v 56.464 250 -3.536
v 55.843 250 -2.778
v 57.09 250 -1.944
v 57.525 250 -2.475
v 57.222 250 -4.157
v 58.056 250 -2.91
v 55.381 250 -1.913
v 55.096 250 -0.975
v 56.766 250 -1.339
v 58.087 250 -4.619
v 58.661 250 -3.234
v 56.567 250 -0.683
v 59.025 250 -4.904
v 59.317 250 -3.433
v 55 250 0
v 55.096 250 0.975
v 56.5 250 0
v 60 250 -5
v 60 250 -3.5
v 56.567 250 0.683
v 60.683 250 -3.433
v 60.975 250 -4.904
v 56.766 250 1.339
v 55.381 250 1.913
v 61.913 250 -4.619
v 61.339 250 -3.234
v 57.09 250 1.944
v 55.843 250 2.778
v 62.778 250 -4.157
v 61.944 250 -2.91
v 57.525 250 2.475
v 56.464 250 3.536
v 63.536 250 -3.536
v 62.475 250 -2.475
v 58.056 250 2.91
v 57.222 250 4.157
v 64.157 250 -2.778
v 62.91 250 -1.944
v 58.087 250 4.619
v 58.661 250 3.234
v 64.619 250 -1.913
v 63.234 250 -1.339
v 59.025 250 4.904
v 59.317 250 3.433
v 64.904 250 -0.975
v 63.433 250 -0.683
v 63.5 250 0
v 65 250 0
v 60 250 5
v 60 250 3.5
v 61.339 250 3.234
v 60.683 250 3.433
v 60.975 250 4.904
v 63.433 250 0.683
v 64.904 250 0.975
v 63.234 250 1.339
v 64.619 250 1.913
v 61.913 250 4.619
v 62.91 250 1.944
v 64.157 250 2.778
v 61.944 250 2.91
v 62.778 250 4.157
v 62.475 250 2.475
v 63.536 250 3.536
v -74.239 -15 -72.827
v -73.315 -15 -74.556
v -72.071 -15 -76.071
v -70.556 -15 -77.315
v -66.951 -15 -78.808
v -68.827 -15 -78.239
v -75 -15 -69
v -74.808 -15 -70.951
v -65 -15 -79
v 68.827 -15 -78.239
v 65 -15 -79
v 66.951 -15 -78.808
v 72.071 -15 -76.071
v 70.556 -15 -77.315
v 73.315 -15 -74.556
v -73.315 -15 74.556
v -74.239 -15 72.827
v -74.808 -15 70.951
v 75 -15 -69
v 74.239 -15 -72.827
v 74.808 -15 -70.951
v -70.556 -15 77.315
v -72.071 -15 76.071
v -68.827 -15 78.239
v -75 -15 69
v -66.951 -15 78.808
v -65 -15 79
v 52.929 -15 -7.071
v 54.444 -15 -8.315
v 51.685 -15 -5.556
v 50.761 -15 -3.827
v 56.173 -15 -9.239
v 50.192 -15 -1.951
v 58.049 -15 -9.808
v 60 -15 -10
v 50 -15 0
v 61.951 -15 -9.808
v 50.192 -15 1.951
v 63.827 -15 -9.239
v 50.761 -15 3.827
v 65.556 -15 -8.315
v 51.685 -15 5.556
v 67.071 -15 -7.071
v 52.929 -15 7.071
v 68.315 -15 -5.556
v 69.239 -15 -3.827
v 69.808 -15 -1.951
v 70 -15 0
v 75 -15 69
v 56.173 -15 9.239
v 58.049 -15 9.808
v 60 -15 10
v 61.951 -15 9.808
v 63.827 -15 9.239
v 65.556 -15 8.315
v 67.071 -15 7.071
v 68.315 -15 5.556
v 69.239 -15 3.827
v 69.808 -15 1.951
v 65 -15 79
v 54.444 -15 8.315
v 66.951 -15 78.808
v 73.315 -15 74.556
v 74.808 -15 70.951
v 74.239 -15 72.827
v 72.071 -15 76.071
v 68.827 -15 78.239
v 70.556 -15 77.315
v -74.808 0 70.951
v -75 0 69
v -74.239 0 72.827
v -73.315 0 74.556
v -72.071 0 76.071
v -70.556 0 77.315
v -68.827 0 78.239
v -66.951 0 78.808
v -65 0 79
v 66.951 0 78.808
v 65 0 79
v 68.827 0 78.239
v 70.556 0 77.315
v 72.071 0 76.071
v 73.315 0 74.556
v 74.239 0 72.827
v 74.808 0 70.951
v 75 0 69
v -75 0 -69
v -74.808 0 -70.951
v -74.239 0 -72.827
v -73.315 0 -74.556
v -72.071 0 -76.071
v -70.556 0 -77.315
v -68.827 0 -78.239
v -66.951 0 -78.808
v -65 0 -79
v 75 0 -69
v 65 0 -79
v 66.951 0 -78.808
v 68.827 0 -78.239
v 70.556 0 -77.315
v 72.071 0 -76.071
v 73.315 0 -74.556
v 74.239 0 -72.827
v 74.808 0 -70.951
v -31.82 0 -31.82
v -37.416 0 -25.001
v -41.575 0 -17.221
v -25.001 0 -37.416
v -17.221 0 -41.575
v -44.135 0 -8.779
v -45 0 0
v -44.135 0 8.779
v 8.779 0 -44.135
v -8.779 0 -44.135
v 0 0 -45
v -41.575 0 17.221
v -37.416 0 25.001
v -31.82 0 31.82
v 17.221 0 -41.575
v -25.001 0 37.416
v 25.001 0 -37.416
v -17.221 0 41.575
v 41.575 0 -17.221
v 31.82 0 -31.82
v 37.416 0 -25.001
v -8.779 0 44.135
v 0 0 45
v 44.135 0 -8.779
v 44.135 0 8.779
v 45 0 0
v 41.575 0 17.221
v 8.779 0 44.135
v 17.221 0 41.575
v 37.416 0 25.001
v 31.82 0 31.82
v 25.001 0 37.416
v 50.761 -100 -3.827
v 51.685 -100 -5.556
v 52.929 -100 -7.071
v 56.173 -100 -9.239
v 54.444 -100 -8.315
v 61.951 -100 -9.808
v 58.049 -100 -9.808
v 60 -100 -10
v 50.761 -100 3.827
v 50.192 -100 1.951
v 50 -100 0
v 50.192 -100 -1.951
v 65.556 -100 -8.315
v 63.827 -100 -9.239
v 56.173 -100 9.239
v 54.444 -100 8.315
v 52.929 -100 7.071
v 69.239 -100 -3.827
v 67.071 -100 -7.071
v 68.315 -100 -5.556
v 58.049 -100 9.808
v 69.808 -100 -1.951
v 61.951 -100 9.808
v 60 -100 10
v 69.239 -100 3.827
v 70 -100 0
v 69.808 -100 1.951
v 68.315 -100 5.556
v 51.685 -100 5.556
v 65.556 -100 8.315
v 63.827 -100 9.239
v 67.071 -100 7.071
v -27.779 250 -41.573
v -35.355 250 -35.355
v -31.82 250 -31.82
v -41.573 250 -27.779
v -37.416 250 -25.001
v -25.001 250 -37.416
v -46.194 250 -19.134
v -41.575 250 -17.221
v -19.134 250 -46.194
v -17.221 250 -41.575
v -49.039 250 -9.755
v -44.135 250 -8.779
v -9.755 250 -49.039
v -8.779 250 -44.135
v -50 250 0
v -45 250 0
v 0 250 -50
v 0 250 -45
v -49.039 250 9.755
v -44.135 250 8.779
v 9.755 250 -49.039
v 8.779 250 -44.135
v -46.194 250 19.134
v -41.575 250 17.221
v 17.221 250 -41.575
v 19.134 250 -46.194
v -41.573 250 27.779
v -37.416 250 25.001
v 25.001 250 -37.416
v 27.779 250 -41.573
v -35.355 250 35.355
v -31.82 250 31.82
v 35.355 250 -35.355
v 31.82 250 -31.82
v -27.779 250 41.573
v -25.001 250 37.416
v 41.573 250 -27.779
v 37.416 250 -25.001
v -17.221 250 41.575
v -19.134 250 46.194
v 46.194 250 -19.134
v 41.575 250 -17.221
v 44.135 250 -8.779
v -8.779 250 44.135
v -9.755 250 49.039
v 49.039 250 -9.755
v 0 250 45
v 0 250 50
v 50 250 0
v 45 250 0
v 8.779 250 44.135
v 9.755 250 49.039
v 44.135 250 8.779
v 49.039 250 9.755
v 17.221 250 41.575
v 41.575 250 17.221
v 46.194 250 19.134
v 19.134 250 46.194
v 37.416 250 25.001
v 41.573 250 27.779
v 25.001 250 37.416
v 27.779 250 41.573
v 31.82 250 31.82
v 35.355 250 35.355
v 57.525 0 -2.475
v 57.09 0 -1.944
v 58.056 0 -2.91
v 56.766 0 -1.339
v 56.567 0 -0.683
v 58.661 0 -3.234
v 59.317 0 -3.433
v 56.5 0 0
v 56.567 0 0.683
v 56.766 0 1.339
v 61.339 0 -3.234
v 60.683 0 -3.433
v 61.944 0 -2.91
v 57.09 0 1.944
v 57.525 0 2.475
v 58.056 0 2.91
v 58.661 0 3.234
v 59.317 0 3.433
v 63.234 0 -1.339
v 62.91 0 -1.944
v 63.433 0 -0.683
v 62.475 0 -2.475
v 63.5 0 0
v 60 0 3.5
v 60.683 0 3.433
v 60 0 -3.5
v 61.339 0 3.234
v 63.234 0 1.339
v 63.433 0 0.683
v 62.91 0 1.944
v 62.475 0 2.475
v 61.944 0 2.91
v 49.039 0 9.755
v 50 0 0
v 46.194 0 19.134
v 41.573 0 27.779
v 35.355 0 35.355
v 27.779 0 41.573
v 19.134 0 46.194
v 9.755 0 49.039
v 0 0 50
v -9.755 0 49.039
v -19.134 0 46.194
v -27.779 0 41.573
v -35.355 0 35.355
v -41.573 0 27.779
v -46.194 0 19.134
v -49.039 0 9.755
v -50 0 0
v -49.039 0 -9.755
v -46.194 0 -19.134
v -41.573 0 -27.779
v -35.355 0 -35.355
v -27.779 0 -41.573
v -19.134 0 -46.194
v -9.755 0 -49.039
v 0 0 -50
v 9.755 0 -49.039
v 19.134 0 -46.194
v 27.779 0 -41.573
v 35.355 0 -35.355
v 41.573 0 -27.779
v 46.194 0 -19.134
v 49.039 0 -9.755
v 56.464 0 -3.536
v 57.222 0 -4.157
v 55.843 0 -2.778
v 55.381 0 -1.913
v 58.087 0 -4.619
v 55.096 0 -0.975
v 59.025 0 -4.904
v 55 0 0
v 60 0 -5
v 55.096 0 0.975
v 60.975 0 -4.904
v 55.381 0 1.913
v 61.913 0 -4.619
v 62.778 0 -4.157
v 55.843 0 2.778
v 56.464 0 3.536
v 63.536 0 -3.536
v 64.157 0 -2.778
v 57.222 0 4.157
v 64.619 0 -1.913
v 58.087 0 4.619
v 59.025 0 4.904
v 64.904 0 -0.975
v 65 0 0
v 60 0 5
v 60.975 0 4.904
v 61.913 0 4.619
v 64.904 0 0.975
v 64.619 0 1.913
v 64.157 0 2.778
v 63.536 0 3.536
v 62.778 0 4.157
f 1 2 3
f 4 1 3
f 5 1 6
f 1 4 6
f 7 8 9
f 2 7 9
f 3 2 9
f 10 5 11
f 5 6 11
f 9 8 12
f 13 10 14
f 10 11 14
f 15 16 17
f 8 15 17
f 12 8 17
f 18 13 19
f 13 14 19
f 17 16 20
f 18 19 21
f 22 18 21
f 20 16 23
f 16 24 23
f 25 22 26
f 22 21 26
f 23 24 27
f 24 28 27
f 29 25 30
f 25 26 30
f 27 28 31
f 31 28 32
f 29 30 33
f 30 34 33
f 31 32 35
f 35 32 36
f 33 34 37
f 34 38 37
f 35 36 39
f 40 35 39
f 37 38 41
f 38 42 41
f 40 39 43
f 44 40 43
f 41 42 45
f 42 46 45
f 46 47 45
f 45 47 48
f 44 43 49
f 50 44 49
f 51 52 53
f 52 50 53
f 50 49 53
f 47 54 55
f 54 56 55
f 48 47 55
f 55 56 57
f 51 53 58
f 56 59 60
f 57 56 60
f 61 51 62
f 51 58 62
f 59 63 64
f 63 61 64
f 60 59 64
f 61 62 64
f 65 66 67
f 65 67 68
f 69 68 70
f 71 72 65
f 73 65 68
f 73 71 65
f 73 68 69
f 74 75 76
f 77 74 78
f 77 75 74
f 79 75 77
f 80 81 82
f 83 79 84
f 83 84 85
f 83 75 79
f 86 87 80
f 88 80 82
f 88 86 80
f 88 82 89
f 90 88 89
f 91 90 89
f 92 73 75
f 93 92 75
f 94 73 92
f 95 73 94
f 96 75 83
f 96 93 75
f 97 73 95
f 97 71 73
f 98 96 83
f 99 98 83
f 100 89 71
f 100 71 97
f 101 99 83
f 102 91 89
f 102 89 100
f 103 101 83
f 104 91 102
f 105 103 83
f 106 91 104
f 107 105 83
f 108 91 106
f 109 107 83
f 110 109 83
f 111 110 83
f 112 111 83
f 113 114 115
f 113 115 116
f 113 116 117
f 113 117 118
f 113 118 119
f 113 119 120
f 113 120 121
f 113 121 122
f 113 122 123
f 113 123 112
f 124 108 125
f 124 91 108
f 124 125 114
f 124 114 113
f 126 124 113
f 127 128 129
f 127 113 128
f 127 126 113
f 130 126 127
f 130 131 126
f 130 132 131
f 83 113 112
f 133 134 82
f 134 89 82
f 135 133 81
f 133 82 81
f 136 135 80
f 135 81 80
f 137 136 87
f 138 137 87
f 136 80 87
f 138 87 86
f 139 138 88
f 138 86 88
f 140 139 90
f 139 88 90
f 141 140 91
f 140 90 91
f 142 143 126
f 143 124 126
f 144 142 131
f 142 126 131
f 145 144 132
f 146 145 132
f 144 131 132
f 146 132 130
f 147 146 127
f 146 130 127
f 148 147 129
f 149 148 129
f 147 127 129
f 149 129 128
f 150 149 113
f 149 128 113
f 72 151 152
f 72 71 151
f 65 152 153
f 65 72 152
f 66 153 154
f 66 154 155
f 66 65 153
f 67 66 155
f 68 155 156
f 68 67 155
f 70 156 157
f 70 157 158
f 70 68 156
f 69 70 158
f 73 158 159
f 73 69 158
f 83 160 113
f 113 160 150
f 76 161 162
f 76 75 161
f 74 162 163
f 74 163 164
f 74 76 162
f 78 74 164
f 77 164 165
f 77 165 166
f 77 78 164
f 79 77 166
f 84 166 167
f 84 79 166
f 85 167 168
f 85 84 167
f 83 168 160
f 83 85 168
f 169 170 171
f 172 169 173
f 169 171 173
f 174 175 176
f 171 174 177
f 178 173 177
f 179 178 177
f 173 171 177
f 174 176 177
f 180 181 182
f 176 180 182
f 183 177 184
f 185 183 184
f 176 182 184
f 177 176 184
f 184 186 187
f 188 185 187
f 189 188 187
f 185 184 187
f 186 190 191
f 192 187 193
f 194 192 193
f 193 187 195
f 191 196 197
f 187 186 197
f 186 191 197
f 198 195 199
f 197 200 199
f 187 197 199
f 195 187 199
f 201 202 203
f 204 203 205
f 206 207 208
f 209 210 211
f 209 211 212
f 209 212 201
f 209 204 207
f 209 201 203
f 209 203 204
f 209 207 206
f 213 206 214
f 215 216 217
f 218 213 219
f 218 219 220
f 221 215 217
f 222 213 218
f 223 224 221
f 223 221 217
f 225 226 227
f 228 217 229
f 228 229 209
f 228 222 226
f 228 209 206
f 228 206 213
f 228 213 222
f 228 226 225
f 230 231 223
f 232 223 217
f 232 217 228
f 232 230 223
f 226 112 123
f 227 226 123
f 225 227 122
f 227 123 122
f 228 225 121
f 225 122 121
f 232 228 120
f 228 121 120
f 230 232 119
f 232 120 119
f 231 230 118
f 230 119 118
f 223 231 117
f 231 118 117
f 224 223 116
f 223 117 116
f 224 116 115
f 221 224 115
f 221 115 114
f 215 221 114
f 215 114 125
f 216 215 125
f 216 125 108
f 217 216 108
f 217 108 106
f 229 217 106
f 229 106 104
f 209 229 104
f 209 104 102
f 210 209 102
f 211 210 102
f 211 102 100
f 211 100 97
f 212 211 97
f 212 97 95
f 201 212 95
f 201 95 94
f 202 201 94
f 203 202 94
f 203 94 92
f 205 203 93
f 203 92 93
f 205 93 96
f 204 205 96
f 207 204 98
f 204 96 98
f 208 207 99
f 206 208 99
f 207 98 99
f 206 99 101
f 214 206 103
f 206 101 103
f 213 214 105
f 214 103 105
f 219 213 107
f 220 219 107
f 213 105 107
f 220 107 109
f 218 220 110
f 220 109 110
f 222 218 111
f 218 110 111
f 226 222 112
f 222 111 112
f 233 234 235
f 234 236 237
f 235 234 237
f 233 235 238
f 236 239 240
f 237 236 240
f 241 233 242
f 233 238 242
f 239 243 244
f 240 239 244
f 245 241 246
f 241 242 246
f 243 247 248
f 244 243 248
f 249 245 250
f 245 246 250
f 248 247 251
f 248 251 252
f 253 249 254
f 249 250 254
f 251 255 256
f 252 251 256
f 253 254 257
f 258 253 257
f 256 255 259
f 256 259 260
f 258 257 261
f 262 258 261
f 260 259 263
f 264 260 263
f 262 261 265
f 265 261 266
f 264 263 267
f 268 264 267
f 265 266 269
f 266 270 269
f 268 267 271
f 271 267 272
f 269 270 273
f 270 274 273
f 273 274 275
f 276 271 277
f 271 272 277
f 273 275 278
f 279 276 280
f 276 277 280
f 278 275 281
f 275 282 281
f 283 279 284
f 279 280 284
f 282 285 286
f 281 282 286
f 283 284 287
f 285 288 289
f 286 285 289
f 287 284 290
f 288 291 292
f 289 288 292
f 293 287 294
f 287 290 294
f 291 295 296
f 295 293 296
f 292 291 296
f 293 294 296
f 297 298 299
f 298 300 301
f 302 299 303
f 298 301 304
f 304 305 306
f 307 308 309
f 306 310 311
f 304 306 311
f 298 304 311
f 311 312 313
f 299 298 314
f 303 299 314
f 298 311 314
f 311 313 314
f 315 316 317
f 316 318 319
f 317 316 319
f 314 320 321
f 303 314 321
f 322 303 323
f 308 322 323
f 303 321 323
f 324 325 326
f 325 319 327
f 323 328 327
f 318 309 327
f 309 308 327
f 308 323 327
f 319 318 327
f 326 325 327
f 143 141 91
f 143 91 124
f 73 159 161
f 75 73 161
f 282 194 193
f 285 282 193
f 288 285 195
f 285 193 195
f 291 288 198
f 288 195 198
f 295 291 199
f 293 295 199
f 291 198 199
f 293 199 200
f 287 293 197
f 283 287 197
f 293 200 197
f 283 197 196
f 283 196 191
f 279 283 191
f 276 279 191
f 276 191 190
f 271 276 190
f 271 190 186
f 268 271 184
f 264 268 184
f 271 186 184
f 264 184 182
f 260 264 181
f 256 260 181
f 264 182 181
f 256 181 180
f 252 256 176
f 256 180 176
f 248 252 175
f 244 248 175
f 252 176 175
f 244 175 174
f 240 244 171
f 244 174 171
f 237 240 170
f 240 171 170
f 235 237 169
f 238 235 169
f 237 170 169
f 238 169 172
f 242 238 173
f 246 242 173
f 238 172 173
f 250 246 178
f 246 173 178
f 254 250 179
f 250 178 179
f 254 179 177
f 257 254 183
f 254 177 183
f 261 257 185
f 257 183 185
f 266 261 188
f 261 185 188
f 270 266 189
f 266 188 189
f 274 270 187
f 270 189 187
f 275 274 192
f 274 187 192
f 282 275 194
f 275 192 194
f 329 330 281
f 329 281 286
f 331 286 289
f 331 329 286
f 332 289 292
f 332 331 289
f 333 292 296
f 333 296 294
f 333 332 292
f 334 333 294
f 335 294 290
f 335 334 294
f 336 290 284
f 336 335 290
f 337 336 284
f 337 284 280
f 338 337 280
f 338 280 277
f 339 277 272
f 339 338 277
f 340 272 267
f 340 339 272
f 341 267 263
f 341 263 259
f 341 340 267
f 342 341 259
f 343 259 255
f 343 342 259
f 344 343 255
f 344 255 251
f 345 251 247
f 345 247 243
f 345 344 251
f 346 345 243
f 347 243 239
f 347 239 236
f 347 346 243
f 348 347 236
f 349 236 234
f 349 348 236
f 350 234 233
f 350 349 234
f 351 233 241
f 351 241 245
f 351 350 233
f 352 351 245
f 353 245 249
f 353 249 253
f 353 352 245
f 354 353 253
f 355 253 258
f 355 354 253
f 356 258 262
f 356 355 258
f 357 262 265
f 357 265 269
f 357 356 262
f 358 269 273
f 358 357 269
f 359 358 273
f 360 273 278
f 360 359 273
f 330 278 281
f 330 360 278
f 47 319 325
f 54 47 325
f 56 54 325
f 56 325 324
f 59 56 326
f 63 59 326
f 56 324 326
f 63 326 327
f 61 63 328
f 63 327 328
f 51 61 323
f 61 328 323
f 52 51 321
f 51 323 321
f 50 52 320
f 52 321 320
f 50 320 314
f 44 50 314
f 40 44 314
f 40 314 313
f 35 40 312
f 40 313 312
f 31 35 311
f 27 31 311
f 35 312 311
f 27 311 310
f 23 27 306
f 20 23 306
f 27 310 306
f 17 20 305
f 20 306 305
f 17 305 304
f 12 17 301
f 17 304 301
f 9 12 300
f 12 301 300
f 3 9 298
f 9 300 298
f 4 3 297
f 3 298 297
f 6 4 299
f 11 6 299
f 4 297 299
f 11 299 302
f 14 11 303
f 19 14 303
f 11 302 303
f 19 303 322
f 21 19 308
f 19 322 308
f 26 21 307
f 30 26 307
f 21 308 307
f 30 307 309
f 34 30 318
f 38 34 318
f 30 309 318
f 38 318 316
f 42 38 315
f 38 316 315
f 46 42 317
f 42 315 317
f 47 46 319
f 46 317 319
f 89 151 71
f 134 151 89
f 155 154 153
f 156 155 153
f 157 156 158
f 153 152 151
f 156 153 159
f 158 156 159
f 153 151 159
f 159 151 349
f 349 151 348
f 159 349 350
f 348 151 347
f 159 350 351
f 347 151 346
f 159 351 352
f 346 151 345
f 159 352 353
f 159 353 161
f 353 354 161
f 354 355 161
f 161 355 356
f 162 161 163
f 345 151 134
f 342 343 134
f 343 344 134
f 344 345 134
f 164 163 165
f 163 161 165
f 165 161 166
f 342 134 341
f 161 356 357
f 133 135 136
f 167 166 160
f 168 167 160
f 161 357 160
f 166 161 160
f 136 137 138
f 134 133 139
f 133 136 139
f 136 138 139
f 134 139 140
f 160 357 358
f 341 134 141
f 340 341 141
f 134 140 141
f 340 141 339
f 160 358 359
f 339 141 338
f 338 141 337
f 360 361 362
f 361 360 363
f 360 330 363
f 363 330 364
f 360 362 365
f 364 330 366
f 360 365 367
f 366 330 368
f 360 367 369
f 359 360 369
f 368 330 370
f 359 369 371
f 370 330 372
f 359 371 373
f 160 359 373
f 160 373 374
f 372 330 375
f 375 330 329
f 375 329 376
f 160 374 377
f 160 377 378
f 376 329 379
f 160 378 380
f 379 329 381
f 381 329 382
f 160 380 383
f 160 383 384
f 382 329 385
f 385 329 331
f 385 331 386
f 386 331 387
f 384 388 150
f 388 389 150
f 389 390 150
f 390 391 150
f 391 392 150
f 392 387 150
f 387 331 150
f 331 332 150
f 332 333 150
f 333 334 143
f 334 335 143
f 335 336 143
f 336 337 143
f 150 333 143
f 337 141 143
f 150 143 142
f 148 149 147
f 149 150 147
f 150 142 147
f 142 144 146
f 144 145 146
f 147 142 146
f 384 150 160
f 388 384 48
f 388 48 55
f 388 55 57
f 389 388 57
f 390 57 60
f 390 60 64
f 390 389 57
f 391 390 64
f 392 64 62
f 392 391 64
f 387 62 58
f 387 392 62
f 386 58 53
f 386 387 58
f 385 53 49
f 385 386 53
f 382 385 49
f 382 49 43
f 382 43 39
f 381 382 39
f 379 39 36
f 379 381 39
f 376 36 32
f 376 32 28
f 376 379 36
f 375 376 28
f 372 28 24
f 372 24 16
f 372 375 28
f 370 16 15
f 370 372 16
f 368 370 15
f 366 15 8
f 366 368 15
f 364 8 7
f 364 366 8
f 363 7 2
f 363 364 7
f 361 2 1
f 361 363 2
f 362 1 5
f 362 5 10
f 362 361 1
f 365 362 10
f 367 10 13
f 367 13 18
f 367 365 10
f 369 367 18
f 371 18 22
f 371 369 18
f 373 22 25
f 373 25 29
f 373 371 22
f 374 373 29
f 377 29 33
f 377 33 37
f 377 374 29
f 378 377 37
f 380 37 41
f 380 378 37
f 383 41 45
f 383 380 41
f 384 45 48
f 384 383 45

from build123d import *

# Parameters (mm, degrees)
F0_W     = 150
F0_H     = 158
F1_DEPTH = 15
F2_R     = 50
F2_R_2   = 45
F3_DEPTH = 250
F4_R     = 5
F4_R_2   = 3.5
F5_DEPTH = 250
F6_R     = 10
F7_R     = 10
F8_DEPTH = 100


with BuildPart() as f1:
    # F0 (on Front) → F1 (new body)
    with BuildSketch(Plane.XZ):
        Rectangle(F0_W, F0_H)
    extrude(amount=F1_DEPTH)

    # F2 (on Front) → F3 (join)
    with BuildSketch(Plane.XZ):
        Circle(F2_R)
        Circle(F2_R_2, mode=Mode.SUBTRACT)
    extrude(amount=-F3_DEPTH)

    # F4 (on Front) → F5 (join)
    with BuildSketch(Plane.XZ):
        with Locations((60, 0)):
            Circle(F4_R)
        with Locations((60, 0)):
            Circle(F4_R_2, mode=Mode.SUBTRACT)
    extrude(amount=-F5_DEPTH)

    # F6
    f6_edges = [f1.edges().sort_by_distance(p)[0] for p in [
        (75, -7.5, 79),
        (-75, -7.5, 79),
        (-75, -7.5, -79),
        (75, -7.5, -79),
    ]]
    fillet(f6_edges, radius=F6_R)

    # F7 (on Front) → F8 (join)
    with BuildSketch(Plane.XZ):
        with Locations((60, 0)):
            Circle(F7_R)
    extrude(amount=F8_DEPTH)


solid = f1.part
